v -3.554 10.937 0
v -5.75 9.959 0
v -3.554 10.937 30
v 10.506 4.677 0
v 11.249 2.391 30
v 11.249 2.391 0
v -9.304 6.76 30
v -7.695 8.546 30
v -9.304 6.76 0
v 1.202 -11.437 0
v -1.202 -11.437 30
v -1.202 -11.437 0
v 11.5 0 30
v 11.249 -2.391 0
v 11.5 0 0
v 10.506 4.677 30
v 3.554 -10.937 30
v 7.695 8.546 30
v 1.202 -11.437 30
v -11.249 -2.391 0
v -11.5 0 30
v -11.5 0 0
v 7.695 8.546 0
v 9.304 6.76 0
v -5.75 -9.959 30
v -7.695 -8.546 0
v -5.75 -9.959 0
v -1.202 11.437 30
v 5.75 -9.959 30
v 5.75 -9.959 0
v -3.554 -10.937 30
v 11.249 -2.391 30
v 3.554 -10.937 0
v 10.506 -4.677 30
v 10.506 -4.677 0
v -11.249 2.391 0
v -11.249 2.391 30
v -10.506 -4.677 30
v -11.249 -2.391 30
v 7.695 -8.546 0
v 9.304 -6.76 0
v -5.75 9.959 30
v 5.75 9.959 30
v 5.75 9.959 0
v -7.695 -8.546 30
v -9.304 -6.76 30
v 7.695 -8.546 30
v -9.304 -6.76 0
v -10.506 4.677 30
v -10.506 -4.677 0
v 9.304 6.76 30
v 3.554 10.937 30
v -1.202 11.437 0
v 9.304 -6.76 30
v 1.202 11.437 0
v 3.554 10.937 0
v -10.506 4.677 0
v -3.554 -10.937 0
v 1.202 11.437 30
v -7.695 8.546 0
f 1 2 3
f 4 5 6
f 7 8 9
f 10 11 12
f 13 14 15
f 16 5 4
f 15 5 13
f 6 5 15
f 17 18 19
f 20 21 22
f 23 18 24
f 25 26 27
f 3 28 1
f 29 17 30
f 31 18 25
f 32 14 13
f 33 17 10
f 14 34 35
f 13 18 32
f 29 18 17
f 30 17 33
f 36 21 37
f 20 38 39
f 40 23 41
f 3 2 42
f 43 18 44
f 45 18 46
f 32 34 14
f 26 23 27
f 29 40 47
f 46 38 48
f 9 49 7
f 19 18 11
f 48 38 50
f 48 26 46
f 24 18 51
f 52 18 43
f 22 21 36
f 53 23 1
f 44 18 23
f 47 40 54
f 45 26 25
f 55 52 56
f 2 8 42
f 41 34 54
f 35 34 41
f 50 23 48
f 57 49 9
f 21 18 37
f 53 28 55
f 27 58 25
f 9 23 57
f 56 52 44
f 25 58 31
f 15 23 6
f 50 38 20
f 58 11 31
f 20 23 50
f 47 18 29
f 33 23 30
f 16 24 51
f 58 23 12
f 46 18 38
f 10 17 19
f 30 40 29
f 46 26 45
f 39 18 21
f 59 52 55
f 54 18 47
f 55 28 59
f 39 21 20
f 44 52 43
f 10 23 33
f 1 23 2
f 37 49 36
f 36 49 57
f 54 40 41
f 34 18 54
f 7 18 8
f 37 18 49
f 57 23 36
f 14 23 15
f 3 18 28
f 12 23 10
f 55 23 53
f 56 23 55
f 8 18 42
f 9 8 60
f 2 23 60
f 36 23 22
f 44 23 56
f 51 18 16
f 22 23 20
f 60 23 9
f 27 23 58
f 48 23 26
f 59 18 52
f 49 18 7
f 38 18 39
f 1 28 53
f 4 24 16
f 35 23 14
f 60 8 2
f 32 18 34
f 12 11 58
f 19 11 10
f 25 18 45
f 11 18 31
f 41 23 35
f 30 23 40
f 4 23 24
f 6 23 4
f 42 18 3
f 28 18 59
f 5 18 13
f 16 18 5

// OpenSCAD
$fn = 30;

module profile() {
  circle(d=23);
}

hull()
  linear_extrude(30)
    profile();
